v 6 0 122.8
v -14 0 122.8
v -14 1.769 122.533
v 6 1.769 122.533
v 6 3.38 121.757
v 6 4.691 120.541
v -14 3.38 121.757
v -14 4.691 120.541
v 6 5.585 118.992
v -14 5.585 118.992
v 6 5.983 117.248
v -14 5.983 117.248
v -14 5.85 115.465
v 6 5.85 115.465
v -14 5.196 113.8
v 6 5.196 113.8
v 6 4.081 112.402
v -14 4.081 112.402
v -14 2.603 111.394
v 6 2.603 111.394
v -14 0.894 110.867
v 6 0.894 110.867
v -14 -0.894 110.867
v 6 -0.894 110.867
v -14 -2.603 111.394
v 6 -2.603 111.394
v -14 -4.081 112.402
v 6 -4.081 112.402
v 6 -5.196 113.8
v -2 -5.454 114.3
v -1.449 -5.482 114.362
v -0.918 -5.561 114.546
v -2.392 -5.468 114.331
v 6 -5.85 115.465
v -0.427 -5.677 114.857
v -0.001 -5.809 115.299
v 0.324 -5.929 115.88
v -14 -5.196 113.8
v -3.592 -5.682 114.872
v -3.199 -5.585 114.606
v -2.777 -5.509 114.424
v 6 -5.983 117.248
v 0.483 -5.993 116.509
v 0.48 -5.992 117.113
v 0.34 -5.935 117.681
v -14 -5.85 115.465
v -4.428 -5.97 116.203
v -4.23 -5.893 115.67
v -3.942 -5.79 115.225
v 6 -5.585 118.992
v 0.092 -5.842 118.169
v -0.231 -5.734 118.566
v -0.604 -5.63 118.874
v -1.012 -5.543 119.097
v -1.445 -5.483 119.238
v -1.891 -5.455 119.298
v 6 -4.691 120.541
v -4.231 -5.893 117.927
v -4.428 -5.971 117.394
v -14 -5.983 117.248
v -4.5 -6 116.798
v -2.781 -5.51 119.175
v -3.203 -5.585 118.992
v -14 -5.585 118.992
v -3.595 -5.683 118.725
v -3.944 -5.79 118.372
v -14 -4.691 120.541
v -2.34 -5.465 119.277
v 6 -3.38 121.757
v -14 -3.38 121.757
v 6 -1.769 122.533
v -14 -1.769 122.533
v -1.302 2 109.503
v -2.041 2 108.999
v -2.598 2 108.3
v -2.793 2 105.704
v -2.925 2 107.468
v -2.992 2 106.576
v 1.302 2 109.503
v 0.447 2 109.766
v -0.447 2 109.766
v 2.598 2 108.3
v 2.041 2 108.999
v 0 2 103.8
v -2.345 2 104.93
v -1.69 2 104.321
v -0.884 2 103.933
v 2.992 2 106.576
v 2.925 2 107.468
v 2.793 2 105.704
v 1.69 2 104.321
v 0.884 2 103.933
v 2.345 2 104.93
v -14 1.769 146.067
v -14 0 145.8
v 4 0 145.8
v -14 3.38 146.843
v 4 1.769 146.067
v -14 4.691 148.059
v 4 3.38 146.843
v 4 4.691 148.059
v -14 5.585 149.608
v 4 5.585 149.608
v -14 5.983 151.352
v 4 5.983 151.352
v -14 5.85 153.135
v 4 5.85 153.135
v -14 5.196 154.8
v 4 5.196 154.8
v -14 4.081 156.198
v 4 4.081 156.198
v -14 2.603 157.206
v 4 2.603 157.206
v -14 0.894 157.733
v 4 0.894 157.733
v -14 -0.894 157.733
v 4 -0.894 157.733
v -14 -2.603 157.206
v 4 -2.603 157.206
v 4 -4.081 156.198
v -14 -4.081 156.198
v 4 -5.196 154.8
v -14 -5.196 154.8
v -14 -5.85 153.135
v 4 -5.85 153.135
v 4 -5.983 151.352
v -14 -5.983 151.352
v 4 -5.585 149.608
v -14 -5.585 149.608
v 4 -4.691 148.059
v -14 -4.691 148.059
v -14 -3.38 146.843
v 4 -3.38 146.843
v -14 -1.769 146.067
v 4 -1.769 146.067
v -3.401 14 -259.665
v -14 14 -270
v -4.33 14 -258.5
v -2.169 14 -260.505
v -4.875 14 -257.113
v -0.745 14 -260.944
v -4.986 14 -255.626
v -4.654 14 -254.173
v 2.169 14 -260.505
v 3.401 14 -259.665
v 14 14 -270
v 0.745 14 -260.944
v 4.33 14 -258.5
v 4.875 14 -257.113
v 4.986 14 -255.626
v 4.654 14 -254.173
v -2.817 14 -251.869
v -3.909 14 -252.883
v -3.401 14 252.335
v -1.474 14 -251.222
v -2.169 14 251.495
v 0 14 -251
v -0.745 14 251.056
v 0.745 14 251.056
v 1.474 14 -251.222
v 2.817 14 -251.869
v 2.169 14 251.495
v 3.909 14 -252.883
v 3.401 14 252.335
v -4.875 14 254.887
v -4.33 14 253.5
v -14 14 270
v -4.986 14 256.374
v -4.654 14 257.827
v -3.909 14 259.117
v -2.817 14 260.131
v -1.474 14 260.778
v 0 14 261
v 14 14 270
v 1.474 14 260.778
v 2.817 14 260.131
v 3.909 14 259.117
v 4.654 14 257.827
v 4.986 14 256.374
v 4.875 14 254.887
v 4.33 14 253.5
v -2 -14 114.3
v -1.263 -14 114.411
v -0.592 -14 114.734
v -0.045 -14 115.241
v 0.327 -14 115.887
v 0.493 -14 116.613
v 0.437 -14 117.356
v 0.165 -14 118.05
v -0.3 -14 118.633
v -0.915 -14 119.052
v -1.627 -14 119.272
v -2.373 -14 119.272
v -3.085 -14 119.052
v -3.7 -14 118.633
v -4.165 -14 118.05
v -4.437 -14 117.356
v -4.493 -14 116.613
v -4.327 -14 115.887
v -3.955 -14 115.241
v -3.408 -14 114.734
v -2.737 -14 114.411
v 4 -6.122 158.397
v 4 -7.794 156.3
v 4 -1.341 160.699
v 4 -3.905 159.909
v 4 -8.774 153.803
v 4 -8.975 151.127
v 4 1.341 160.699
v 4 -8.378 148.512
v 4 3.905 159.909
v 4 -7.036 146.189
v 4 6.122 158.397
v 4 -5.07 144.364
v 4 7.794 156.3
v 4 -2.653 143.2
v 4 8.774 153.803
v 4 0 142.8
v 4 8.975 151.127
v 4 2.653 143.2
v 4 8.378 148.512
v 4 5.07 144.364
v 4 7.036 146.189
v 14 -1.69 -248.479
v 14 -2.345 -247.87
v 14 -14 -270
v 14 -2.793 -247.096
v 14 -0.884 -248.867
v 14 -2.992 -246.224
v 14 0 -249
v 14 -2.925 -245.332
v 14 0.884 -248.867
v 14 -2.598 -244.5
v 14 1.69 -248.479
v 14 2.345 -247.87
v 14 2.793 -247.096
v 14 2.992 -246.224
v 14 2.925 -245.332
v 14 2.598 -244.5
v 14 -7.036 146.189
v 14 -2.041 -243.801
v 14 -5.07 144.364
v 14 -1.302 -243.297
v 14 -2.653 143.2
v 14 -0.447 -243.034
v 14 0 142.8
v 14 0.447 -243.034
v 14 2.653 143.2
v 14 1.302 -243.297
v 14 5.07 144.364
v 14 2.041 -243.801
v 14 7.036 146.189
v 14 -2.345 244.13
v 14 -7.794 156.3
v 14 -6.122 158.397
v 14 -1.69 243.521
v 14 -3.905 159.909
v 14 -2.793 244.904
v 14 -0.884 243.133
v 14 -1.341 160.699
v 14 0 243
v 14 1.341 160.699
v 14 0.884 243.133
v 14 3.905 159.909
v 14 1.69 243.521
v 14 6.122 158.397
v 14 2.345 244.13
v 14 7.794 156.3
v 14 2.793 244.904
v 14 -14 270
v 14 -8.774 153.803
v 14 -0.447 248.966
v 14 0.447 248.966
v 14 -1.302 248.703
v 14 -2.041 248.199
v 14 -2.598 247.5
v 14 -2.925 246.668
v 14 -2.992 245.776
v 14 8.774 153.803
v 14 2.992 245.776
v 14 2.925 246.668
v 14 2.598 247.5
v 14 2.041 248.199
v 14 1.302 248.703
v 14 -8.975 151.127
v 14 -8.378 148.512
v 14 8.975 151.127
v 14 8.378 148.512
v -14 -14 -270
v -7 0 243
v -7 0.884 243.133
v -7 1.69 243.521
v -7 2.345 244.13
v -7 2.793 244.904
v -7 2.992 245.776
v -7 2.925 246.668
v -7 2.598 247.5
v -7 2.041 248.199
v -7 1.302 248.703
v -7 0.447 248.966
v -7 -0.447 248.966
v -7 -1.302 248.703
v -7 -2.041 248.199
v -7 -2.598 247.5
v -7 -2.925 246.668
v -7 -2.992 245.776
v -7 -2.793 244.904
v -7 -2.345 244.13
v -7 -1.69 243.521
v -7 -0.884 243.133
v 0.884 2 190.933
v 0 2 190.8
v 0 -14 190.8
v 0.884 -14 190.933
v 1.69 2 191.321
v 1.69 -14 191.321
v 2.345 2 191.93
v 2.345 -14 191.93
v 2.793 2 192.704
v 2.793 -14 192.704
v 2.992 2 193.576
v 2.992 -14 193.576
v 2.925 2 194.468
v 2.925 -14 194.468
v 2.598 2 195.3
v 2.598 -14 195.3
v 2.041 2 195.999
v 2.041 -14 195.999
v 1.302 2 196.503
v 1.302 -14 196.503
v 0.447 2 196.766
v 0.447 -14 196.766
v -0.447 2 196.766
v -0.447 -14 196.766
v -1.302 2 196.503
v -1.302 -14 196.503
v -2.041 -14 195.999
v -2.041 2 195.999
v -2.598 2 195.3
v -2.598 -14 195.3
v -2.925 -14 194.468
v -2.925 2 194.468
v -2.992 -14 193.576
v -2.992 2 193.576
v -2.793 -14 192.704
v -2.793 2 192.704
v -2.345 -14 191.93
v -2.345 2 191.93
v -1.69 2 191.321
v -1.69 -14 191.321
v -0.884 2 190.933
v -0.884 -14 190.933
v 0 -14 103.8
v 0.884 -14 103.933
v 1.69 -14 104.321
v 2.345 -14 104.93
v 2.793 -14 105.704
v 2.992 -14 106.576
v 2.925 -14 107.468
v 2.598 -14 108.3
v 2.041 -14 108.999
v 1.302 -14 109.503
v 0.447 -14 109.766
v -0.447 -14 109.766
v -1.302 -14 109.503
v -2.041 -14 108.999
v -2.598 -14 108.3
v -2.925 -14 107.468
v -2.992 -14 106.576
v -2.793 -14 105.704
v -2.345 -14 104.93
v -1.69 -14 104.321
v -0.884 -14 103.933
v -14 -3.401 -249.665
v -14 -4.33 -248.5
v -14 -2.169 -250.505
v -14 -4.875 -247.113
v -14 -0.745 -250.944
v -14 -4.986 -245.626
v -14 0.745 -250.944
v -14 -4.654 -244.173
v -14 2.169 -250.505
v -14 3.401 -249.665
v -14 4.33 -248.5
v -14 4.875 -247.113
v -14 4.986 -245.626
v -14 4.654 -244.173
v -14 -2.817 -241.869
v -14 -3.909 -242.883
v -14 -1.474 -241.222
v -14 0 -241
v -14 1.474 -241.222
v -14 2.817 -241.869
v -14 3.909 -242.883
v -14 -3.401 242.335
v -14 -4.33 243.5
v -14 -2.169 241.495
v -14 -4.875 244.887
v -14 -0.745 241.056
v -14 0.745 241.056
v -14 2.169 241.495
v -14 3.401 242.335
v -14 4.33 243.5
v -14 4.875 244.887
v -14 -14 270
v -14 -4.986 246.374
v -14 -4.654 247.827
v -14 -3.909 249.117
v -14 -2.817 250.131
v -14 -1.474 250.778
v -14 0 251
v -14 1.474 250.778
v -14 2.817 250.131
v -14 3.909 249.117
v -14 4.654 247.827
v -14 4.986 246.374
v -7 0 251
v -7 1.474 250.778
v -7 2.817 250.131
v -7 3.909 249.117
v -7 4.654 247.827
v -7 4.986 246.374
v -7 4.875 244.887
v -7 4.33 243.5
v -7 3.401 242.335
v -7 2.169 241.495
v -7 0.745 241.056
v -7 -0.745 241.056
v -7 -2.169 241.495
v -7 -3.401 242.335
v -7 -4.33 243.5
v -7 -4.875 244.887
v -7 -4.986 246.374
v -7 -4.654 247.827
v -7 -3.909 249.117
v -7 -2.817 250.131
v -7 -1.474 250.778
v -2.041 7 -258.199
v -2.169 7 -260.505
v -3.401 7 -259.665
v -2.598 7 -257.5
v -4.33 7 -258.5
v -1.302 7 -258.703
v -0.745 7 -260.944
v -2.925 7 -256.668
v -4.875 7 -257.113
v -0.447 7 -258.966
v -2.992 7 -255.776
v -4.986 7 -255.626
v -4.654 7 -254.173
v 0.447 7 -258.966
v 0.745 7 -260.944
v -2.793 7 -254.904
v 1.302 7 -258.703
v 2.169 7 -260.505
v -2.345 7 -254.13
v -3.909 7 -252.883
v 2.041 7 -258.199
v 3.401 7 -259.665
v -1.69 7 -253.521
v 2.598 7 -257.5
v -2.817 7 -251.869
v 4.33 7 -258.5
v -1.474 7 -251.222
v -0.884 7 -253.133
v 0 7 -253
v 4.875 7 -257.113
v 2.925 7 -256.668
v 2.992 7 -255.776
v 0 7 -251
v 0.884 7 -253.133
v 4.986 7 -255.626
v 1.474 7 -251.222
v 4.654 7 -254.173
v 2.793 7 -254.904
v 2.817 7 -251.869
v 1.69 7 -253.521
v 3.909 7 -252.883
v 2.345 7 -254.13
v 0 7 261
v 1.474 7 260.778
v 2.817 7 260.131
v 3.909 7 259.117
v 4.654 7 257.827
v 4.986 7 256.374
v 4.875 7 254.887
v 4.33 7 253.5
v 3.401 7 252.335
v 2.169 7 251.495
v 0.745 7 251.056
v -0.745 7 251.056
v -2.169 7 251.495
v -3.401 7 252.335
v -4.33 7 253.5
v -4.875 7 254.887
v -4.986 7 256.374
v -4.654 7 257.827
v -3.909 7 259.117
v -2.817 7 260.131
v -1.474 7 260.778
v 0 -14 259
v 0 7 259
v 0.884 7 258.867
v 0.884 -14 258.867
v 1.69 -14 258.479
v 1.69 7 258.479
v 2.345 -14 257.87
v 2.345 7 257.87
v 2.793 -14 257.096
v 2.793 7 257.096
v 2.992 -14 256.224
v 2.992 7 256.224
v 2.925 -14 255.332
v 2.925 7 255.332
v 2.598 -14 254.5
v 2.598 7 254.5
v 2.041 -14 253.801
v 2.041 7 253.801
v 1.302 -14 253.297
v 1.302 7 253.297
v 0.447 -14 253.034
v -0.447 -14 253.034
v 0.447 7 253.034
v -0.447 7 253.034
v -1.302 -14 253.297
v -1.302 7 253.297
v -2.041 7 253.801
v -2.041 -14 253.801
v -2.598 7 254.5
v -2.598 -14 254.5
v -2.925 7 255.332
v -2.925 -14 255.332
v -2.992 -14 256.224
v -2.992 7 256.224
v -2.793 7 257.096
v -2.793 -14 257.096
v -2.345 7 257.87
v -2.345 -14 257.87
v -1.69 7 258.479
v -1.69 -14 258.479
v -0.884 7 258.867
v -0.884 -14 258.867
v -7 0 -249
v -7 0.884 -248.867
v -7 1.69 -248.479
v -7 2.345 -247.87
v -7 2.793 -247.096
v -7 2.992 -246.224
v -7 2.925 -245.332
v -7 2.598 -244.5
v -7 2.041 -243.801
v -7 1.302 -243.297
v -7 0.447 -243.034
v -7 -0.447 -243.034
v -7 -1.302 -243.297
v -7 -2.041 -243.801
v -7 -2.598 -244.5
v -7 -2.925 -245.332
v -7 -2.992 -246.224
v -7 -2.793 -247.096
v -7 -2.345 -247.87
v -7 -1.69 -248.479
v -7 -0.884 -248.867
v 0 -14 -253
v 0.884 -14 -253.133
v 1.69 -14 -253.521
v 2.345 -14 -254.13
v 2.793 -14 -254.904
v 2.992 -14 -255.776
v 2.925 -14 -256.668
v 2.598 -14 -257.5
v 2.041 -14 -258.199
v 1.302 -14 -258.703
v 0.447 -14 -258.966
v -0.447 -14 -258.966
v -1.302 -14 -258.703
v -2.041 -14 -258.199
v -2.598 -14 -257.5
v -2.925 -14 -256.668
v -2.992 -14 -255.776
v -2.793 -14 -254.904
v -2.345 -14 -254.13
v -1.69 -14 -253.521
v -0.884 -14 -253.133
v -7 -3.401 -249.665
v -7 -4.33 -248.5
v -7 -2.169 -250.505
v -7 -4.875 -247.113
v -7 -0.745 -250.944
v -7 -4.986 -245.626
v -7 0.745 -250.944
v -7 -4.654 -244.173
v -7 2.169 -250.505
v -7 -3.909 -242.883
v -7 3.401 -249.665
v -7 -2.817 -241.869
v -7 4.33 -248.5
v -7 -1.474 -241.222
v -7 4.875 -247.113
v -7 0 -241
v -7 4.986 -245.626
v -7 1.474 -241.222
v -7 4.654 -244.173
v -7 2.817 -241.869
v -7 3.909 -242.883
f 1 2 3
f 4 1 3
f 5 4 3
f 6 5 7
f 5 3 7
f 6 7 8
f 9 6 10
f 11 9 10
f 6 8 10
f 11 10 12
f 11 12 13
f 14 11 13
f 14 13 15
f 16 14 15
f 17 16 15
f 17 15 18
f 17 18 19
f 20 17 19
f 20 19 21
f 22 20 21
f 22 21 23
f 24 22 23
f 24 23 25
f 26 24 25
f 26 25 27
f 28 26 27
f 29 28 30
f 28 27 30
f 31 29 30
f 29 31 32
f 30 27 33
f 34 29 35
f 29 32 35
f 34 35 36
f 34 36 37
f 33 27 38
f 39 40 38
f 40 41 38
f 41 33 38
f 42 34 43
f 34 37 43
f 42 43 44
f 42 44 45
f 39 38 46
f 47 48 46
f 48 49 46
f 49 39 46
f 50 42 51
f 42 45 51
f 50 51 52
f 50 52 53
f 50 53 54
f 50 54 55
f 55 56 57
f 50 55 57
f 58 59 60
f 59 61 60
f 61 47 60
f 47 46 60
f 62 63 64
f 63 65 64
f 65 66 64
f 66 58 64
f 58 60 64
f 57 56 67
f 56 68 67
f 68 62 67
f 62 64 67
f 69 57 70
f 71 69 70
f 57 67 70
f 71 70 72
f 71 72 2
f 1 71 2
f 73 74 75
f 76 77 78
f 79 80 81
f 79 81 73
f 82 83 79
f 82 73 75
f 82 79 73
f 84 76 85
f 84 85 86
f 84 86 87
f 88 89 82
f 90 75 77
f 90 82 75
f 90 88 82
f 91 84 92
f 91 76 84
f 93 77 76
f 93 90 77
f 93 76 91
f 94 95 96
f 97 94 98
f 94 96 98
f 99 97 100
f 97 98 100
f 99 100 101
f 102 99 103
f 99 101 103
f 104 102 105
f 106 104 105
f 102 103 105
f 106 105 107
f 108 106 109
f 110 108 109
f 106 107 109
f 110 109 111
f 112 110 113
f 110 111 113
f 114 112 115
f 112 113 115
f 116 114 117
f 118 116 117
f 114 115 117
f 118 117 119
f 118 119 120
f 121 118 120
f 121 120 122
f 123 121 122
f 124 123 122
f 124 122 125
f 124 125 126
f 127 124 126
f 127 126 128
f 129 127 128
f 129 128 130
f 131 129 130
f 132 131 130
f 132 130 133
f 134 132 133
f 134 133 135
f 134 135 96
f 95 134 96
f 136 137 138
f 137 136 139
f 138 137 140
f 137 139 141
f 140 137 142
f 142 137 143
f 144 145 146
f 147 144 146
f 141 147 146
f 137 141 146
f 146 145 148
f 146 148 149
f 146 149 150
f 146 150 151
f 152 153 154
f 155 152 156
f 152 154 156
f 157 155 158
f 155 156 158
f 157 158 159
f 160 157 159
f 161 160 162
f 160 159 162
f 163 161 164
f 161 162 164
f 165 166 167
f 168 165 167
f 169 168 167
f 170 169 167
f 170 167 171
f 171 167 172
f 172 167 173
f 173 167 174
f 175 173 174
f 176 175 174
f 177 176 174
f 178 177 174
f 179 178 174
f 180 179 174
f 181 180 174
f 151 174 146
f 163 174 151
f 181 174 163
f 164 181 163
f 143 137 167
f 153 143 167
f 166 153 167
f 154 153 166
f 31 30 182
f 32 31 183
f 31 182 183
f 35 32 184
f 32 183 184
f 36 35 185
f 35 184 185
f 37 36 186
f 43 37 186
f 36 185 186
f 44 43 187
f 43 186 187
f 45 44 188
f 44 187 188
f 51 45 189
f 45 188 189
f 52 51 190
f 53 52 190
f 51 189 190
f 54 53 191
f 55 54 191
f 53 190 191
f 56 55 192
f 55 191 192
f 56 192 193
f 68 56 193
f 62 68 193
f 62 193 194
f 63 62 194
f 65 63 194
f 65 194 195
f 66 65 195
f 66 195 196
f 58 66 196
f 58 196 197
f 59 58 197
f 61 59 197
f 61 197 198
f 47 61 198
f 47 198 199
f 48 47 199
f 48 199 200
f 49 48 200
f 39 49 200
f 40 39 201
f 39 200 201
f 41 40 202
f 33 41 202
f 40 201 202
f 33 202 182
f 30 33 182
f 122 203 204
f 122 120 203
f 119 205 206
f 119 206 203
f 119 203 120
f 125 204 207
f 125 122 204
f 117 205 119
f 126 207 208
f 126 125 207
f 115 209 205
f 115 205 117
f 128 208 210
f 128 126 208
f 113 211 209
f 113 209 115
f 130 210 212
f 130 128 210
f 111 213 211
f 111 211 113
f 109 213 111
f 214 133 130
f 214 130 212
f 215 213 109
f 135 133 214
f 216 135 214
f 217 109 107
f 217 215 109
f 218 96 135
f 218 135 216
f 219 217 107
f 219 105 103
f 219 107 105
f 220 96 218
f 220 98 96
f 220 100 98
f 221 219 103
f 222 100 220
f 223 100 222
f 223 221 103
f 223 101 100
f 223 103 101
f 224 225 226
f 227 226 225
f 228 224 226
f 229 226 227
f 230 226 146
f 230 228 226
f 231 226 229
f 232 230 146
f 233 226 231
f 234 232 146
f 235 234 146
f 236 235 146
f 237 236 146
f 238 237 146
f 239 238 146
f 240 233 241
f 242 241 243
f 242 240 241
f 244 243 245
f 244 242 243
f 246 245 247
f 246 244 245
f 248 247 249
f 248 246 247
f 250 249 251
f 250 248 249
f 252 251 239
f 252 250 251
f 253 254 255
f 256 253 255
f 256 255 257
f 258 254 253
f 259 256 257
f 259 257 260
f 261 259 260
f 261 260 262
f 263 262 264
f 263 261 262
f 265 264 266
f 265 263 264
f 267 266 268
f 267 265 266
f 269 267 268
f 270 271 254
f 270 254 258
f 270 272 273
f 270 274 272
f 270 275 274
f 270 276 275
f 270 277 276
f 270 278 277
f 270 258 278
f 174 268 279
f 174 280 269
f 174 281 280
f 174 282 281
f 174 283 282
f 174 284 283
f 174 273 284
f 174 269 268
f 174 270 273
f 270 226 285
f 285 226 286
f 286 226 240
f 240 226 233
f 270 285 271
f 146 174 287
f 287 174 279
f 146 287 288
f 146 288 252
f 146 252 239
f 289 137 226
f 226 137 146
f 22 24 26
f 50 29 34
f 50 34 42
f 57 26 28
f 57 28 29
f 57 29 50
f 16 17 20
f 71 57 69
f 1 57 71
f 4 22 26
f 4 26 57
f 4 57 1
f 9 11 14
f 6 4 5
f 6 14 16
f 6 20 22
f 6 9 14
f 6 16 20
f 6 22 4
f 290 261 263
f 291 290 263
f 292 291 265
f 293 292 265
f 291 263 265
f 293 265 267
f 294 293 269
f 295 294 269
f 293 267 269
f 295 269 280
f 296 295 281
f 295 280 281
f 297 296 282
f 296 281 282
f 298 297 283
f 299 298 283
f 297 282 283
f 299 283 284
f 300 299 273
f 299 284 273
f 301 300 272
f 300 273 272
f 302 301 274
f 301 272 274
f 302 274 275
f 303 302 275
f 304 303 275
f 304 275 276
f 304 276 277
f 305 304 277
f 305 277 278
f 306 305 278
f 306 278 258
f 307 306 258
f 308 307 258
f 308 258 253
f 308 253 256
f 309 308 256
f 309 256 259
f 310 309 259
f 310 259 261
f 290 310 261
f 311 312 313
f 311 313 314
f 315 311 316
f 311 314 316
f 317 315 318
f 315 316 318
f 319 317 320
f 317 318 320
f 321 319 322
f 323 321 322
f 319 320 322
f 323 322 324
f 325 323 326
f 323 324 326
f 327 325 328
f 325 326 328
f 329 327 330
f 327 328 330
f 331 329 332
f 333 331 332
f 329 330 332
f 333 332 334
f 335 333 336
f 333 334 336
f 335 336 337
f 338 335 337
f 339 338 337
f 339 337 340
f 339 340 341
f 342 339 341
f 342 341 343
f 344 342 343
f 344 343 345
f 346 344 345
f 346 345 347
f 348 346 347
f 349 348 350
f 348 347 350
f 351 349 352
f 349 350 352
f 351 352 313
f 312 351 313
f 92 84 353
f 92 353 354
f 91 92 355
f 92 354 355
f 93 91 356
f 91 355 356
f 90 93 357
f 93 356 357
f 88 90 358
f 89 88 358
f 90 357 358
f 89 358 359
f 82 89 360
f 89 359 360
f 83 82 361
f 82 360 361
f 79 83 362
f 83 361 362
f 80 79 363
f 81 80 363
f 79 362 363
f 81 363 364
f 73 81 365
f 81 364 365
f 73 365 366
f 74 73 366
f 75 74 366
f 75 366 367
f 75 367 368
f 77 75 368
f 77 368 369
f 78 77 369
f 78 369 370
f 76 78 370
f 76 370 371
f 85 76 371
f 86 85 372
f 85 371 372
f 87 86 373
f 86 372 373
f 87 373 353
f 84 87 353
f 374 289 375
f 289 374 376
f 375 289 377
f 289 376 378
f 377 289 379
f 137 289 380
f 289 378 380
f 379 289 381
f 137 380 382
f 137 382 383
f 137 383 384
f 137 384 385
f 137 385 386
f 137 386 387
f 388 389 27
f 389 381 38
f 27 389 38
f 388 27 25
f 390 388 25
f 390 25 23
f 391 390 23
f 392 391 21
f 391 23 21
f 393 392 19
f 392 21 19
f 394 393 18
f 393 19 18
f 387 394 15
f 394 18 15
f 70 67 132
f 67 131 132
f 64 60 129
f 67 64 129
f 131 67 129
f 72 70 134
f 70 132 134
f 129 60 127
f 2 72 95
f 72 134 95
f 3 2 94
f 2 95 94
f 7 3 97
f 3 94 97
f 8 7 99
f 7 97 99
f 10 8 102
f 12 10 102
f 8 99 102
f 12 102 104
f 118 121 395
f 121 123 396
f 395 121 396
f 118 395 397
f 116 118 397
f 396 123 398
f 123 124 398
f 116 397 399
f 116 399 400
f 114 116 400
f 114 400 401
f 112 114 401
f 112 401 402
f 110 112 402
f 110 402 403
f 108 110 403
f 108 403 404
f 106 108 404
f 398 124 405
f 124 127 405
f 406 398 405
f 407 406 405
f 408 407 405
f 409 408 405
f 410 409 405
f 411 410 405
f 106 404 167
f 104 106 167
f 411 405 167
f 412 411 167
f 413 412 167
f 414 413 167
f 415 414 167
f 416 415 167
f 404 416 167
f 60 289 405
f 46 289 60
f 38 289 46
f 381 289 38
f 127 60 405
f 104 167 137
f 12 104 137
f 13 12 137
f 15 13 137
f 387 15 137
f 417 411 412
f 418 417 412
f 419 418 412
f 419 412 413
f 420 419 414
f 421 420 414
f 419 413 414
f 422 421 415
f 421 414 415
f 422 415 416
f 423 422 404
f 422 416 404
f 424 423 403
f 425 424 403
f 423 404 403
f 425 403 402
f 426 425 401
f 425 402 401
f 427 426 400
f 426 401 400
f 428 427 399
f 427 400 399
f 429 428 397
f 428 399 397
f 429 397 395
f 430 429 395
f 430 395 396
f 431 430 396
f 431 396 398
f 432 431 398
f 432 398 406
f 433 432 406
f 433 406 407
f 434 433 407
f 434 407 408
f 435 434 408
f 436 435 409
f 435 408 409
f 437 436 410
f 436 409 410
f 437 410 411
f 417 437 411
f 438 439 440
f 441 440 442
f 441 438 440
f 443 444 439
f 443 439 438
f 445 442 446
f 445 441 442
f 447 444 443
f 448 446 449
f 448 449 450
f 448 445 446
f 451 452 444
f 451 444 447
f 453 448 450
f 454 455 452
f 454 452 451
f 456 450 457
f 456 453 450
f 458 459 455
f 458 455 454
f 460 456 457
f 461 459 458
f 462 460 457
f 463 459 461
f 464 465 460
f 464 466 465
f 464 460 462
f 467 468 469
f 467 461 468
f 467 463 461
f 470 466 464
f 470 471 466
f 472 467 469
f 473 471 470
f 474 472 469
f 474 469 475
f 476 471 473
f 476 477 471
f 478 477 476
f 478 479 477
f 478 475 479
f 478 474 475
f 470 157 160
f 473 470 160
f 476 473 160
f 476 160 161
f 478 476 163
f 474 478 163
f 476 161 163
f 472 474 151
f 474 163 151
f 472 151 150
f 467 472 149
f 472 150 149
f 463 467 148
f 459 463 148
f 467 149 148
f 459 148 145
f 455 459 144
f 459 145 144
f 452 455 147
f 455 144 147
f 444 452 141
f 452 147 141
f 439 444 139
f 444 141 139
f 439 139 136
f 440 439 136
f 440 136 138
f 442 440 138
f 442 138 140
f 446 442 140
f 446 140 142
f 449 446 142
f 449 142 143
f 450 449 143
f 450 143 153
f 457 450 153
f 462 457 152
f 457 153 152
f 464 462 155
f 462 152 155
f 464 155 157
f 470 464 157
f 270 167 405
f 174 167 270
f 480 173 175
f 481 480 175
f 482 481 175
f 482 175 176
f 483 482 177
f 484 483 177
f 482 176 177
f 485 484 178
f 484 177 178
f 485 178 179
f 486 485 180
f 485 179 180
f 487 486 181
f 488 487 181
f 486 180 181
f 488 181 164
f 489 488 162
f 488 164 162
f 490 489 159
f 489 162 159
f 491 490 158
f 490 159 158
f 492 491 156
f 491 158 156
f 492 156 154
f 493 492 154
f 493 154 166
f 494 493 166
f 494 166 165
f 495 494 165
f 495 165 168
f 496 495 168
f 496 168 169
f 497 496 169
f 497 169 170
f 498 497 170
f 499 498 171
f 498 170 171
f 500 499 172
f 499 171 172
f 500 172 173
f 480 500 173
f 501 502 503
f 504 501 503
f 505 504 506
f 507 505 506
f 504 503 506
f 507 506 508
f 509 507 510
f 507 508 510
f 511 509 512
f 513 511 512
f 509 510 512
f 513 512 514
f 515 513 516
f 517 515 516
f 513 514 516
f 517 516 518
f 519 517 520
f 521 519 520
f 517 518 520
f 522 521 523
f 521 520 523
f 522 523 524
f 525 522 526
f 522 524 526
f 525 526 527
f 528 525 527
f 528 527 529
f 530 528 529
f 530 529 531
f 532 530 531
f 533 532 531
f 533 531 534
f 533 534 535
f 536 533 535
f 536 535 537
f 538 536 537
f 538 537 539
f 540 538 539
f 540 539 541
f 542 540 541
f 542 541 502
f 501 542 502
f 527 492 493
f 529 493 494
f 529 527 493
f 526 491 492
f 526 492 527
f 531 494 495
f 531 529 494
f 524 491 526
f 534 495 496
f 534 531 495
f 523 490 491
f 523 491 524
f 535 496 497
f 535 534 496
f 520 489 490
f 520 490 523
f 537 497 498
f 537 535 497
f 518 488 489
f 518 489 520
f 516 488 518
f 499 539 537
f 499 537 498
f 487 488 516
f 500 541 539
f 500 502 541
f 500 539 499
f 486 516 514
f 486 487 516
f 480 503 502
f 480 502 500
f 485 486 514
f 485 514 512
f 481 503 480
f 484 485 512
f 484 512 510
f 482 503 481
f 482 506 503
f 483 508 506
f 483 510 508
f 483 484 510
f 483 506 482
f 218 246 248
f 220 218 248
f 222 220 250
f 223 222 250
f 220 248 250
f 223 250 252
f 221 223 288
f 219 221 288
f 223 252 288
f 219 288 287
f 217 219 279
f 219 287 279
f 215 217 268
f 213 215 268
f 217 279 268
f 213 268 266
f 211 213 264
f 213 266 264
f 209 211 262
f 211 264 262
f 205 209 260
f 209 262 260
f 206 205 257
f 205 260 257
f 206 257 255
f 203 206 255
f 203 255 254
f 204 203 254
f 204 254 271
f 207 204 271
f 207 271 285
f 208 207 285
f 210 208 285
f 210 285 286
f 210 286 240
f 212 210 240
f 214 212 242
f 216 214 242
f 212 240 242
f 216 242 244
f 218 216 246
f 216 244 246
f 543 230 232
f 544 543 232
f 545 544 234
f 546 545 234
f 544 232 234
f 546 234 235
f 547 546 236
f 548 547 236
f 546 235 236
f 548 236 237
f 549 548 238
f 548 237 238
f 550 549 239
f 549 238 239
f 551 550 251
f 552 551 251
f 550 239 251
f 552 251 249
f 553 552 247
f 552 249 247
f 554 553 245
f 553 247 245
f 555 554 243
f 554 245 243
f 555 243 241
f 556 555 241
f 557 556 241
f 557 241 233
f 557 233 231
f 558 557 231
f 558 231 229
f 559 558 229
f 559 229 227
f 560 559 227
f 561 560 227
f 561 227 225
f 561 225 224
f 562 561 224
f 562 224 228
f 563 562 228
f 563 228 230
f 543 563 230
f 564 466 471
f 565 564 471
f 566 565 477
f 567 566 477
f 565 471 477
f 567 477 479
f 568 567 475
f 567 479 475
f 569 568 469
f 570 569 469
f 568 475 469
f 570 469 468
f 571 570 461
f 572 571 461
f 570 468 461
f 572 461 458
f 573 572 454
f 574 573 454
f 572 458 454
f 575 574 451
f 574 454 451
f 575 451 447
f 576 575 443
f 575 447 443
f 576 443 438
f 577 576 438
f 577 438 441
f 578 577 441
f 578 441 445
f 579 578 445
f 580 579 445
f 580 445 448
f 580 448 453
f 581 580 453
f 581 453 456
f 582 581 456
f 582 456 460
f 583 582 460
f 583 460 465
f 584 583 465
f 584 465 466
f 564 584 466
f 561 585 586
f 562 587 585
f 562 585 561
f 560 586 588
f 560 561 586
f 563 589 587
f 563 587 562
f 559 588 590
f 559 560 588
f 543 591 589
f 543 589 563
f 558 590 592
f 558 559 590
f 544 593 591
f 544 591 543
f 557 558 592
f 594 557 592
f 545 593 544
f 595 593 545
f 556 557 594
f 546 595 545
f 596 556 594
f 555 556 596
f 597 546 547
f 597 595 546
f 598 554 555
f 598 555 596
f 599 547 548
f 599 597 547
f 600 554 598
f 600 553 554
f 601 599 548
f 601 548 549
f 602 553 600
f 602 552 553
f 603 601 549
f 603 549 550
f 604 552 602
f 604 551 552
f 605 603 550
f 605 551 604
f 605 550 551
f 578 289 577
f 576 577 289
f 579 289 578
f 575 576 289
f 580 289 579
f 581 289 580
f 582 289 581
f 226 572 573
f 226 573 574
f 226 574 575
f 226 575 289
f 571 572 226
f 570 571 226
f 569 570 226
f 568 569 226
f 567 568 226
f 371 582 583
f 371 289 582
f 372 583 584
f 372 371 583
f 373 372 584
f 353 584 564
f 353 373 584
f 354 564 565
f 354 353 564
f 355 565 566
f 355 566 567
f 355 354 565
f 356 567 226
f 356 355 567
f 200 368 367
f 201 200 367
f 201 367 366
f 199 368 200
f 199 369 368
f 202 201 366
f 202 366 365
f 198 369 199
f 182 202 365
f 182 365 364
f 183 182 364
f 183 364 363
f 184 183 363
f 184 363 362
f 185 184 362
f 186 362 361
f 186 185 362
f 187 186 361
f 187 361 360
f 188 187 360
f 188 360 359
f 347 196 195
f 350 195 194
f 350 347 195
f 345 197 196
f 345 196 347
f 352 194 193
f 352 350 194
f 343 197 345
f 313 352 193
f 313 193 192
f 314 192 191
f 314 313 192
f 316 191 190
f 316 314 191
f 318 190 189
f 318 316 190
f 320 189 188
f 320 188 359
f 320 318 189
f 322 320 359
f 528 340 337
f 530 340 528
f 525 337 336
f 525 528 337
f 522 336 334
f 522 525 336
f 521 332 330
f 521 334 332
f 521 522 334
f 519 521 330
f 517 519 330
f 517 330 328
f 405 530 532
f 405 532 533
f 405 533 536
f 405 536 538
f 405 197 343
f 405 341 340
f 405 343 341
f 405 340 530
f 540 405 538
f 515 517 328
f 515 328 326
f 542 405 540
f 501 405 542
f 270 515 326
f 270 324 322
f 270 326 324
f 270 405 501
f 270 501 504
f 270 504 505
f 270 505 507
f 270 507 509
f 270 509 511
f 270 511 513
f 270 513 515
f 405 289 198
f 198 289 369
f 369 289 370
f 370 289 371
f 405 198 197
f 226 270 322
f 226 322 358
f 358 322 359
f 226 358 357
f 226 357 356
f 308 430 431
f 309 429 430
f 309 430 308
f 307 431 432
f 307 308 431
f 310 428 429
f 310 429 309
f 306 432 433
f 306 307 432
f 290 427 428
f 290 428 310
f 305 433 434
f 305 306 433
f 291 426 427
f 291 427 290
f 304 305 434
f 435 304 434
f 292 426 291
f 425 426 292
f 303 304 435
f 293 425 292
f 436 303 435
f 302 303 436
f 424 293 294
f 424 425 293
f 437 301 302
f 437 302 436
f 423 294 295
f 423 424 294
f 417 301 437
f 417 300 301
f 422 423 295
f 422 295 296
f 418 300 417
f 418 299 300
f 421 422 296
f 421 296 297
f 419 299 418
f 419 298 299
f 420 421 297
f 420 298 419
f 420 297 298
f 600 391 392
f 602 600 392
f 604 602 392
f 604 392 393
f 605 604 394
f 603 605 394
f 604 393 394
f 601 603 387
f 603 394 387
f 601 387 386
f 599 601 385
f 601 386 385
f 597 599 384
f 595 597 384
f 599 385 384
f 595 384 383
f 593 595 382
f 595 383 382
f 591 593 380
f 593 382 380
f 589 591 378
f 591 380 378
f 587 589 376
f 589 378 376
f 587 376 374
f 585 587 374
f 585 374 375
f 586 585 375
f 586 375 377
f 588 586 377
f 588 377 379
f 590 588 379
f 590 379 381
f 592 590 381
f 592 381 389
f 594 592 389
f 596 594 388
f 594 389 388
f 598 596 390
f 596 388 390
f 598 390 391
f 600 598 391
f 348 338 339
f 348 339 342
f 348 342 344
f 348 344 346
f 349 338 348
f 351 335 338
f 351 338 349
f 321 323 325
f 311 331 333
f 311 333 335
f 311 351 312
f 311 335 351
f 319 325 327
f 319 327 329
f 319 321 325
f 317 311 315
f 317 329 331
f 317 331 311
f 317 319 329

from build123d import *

# Parameters (mm, degrees)
IZIM1_W                     = 28
IZIM1_H                     = 28
Y_KSEKLIK_EKSTR_ZYON1_DEPTH = 270
IZIM3_R                     = 5
KES_EKSTR_ZYON2_DEPTH       = 7
IZIM4_R                     = 3
KES_EKSTR_ZYON3_DEPTH       = 272.808756298
IZIM5_R                     = 6
KES_EKSTR_ZYON4_DEPTH       = 272.808756298
IZIM6_R                     = 9
KES_EKSTR_ZYON5_DEPTH       = 10
KES_EKSTR_ZYON6_REACH       = 273.809
IZIM7_R                     = 3
IZIM9_R                     = 5
KES_EKSTR_ZYON8_DEPTH       = 7
SKETCH2_R                   = 3
CUT_EXTRUDE1_DEPTH          = 16
SKETCH3_R                   = 6
CUT_EXTRUDE2_DEPTH          = 20
SKETCH4_R                   = 2.5
CUT_EXTRUDE3_DEPTH          = 10


with BuildPart() as part:
    # Çizim1 → Yükseklik-Ekstrüzyon1 (new, symmetric)
    with BuildSketch(Plane.XY):
        Rectangle(IZIM1_W, IZIM1_H)
    extrude(amount=Y_KSEKLIK_EKSTR_ZYON1_DEPTH, both=True)

    # Çizim3 → Kes-Ekstrüzyon2 (cut)
    with BuildSketch(Plane(origin=(0, 14, 0), x_dir=(1, 0, 0), z_dir=(0, 1, 0))):
        with Locations(Location((0, 256, 0), (0, 0, 270))):
            Circle(IZIM3_R)
        with Locations(Location((0, -256, 0), (0, 0, 270))):
            Circle(IZIM3_R)
    extrude(amount=-KES_EKSTR_ZYON2_DEPTH, mode=Mode.SUBTRACT)

    # Çizim4 → Kes-Ekstrüzyon3 (cut, through all)
    with BuildSketch(Plane(origin=(0, 14, 0), x_dir=(1, 0, 0), z_dir=(0, 1, 0))):
        with Locations(Location((0, -256, 0), (0, 0, 270))):
            Circle(IZIM4_R)
        with Locations(Location((0, 256, 0), (0, 0, 270))):
            Circle(IZIM4_R)
    extrude(amount=-KES_EKSTR_ZYON3_DEPTH, mode=Mode.SUBTRACT)

    # Çizim5 → Kes-Ekstrüzyon4 (cut, through all)
    with BuildSketch(Plane(origin=(14, 0, 0), x_dir=(0, 0, -1), z_dir=(1, 0, 0))):
        with Locations((-151.8, 0)):
            Circle(IZIM5_R)
    extrude(amount=-KES_EKSTR_ZYON4_DEPTH, mode=Mode.SUBTRACT)

    # Çizim6 → Kes-Ekstrüzyon5 (cut)
    with BuildSketch(Plane(origin=(14, 0, 0), x_dir=(0, 0, -1), z_dir=(1, 0, 0))):
        with Locations((-151.8, 0)):
            Circle(IZIM6_R)
    extrude(amount=-KES_EKSTR_ZYON5_DEPTH, mode=Mode.SUBTRACT)

    # Çizim7 → Kes-Ekstrüzyon6 (cut, up to next)
    with BuildSketch(Plane(origin=(14, 0, 0), x_dir=(0, 0, -1), z_dir=(1, 0, 0)), mode=Mode.PRIVATE) as kes_ekstr_zyon6_sk1:
        with Locations((246, 0)):
            Circle(IZIM7_R)
    kes_ekstr_zyon6_tool1 = extrude(kes_ekstr_zyon6_sk1.sketch, amount=-KES_EKSTR_ZYON6_REACH, mode=Mode.PRIVATE) & part.part
    # Çizim7 → Kes-Ekstrüzyon6 (cut, up to next)
    with BuildSketch(Plane(origin=(14, 0, 0), x_dir=(0, 0, -1), z_dir=(1, 0, 0)), mode=Mode.PRIVATE) as kes_ekstr_zyon6_sk2:
        with Locations((-246, 0)):
            Circle(IZIM7_R)
    kes_ekstr_zyon6_tool2 = extrude(kes_ekstr_zyon6_sk2.sketch, amount=-KES_EKSTR_ZYON6_REACH, mode=Mode.PRIVATE) & part.part
    add(kes_ekstr_zyon6_tool1.solids().sort_by_distance((14, 0, -246))[0], mode=Mode.SUBTRACT)
    add(kes_ekstr_zyon6_tool2.solids().sort_by_distance((14, 0, 246))[0], mode=Mode.SUBTRACT)

    # Çizim9 → Kes-Ekstrüzyon8 (cut)
    with BuildSketch(Plane.ZY.offset(14)):
        with Locations((246, 0)):
            Circle(IZIM9_R)
        with Locations((-246, 0)):
            Circle(IZIM9_R)
    extrude(amount=-KES_EKSTR_ZYON8_DEPTH, mode=Mode.SUBTRACT)

    # Sketch2 → Cut-Extrude1 (cut)
    with BuildSketch(Plane.XZ.offset(14)):
        with Locations(Location((0, 193.8, 0), (0, 0, 270))):
            Circle(SKETCH2_R)
        with Locations(Location((0, 106.8, 0), (0, 0, 270))):
            Circle(SKETCH2_R)
    extrude(amount=-CUT_EXTRUDE1_DEPTH, mode=Mode.SUBTRACT)

    # Sketch3 → Cut-Extrude2 (cut)
    with BuildSketch(Plane.ZY.offset(14)):
        with Locations((116.8, 0)):
            Circle(SKETCH3_R)
    extrude(amount=-CUT_EXTRUDE2_DEPTH, mode=Mode.SUBTRACT)

    # Sketch4 → Cut-Extrude3 (cut)
    with BuildSketch(Plane.XZ.offset(14)):
        with Locations(Location((-2, 116.8, 0), (0, 0, 270))):
            Circle(SKETCH4_R)
    extrude(amount=-CUT_EXTRUDE3_DEPTH, mode=Mode.SUBTRACT)


solid = part.part
